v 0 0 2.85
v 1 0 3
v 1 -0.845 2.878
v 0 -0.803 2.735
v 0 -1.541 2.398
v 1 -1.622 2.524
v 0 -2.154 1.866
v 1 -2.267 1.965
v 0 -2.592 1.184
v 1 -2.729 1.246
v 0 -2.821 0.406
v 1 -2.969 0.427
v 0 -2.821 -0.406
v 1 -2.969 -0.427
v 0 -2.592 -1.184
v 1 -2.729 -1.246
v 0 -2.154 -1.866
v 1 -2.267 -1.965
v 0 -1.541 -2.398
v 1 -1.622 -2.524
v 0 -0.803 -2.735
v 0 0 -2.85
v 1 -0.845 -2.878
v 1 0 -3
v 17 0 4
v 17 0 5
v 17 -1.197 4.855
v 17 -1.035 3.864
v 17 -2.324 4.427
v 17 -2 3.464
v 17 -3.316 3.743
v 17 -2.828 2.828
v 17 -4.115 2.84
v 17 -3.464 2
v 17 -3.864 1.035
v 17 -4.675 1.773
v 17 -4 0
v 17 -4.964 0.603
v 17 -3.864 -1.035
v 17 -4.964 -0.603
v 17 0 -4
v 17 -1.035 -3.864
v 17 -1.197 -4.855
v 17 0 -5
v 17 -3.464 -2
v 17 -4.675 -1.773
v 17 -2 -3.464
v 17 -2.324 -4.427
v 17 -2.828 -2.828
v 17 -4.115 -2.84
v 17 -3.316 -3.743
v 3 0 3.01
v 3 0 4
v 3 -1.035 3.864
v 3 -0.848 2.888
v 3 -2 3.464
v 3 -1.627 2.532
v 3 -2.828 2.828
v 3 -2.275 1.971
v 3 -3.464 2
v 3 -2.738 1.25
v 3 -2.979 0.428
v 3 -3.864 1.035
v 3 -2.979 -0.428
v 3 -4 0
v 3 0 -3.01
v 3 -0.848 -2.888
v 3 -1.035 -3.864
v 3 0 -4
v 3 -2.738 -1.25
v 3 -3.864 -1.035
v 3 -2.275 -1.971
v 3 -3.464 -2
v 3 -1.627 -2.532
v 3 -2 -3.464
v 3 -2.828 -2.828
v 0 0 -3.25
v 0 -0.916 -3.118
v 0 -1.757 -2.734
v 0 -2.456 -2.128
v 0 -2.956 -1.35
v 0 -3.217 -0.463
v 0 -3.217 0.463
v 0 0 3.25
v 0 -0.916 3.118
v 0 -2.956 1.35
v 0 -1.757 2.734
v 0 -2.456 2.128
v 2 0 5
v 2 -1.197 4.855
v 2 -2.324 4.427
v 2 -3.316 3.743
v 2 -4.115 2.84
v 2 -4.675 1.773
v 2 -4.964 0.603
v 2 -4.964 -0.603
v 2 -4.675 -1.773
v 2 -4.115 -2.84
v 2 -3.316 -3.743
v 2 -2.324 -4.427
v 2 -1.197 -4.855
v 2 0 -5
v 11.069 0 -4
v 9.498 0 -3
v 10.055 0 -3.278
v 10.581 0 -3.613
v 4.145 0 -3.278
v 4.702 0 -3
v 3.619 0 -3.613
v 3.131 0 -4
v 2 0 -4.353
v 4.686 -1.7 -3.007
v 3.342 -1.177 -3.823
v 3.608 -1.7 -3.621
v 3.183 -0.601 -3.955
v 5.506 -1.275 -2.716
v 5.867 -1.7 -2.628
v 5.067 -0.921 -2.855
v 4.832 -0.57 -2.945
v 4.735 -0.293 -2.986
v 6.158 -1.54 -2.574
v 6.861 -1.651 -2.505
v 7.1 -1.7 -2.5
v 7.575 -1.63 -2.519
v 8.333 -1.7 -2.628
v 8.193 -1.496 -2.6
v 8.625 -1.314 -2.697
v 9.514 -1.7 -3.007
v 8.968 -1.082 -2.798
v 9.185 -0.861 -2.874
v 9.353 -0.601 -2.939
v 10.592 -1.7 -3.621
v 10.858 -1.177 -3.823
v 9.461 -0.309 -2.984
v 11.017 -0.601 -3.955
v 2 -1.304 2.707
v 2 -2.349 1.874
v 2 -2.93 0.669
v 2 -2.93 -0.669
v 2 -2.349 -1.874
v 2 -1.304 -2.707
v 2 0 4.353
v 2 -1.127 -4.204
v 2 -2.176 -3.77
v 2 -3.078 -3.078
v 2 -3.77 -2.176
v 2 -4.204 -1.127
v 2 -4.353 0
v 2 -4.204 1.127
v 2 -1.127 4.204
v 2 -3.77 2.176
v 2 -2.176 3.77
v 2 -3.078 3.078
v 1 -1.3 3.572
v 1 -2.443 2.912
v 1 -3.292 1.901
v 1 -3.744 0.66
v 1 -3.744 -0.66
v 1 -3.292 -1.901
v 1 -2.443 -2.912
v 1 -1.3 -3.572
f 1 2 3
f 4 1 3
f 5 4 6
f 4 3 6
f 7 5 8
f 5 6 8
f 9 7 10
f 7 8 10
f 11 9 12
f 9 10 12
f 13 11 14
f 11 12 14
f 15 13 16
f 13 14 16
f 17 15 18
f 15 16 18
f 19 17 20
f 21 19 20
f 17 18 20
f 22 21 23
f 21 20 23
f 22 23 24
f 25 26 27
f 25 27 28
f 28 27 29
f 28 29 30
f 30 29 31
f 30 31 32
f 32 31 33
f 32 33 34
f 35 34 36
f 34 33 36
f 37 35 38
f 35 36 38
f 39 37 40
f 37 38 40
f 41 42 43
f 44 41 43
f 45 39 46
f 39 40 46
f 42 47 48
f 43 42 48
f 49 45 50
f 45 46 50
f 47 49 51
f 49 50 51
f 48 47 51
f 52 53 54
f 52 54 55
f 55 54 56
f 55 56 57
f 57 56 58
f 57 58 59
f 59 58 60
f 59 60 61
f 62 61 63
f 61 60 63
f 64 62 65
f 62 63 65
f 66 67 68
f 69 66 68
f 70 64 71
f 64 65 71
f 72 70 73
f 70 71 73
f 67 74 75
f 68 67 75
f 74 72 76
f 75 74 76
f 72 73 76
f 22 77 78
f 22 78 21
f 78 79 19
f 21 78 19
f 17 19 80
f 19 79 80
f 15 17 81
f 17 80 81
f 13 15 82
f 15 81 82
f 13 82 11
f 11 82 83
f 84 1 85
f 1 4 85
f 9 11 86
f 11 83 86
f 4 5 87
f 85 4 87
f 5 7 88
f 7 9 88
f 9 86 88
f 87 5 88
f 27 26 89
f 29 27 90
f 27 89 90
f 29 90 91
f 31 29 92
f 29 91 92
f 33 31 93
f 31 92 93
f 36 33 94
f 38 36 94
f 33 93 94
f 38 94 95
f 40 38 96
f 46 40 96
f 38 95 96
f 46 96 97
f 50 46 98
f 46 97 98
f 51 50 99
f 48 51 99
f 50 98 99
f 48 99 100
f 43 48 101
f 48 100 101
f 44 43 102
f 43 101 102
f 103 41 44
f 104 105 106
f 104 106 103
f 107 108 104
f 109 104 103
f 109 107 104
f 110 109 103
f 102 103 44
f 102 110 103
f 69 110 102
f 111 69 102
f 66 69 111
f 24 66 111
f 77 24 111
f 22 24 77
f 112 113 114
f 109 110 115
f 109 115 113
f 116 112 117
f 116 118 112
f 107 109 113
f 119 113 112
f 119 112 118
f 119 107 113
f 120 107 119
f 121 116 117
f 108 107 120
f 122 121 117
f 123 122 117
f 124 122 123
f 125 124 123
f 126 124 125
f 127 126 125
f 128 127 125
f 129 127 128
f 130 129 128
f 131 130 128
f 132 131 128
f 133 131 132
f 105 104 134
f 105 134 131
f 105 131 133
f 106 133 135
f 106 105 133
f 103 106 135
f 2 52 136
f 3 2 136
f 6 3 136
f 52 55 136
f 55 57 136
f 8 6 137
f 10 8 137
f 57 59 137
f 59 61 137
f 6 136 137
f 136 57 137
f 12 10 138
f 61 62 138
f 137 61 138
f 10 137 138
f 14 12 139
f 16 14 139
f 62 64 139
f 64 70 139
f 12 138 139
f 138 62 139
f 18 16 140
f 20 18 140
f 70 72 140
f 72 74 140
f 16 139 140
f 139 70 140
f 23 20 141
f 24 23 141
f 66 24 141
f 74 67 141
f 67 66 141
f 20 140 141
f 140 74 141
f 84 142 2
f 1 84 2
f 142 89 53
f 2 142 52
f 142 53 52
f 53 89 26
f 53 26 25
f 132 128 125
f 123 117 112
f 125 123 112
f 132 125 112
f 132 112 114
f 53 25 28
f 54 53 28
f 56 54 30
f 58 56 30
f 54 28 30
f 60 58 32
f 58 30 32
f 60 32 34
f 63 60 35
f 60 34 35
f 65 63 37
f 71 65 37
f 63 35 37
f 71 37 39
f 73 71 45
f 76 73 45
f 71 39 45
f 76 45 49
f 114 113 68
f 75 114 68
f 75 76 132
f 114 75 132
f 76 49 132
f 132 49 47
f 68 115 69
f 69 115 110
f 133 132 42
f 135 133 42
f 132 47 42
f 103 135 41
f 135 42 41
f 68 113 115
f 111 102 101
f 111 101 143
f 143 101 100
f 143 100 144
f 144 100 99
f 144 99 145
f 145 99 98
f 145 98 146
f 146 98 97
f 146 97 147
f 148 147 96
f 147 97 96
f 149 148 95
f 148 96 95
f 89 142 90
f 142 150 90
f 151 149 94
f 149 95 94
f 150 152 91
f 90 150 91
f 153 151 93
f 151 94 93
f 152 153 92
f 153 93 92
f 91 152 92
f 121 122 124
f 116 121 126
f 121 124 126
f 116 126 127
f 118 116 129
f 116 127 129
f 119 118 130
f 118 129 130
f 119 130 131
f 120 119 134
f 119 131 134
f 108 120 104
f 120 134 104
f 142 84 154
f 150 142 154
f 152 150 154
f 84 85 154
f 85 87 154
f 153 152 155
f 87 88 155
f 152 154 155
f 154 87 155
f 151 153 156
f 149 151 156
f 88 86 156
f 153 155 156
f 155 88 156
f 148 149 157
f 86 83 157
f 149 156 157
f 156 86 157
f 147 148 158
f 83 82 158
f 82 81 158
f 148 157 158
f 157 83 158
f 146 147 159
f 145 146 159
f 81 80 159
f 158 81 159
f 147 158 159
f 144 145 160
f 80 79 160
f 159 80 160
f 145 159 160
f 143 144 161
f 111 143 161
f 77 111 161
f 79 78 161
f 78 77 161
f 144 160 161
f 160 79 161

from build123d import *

# Parameters (mm, degrees)
F3_DEPTH = 25
F5_DEPTH = 1.7
F6_R     = 3
F7_DEPTH = 12.88


with BuildPart() as f1:
    # F0 (on Front) → F1 (revolve)
    with BuildSketch(Plane.XZ):
        Polygon((0, 3.25), (0, 2.85), (1, 3), (3, 3.01), (3, 4), (17, 4), (17, 5), (2, 5), (2, 4.3526792594), align=None)
    revolve(axis=Axis((8.0843353644, 0, 0), (1, 0, 0)))

    # F2 (on face) → F3 (cut)
    with BuildSketch(Plane.YZ.offset(17)):
        Polygon((0, 8.2961460575), (0, 0), (0, -8.2128858194), (10.234137997, -8.383821696), (10.234137997, 8.2961460575), align=None)
    extrude(amount=-F3_DEPTH, mode=Mode.SUBTRACT)

    # F4 (on face) → F5 (join)
    with BuildSketch(Plane(origin=(0, 0, 0), x_dir=(-1, 0, 0), z_dir=(0, 1, 0))):
        with BuildLine():
            Line((-11.0686269666, -4), (-3.1313730334, -4))
            ThreePointArc((-3.1313730334, -4), (-7.1, -2.5), (-11.0686269666, -4))
        make_face()
    extrude(amount=-F5_DEPTH)

    # F6 (on face) → F7 (cut)
    with BuildSketch(Plane.YZ.offset(17)):
        Circle(F6_R)
    extrude(amount=-F7_DEPTH, mode=Mode.SUBTRACT)


solid = f1.part
